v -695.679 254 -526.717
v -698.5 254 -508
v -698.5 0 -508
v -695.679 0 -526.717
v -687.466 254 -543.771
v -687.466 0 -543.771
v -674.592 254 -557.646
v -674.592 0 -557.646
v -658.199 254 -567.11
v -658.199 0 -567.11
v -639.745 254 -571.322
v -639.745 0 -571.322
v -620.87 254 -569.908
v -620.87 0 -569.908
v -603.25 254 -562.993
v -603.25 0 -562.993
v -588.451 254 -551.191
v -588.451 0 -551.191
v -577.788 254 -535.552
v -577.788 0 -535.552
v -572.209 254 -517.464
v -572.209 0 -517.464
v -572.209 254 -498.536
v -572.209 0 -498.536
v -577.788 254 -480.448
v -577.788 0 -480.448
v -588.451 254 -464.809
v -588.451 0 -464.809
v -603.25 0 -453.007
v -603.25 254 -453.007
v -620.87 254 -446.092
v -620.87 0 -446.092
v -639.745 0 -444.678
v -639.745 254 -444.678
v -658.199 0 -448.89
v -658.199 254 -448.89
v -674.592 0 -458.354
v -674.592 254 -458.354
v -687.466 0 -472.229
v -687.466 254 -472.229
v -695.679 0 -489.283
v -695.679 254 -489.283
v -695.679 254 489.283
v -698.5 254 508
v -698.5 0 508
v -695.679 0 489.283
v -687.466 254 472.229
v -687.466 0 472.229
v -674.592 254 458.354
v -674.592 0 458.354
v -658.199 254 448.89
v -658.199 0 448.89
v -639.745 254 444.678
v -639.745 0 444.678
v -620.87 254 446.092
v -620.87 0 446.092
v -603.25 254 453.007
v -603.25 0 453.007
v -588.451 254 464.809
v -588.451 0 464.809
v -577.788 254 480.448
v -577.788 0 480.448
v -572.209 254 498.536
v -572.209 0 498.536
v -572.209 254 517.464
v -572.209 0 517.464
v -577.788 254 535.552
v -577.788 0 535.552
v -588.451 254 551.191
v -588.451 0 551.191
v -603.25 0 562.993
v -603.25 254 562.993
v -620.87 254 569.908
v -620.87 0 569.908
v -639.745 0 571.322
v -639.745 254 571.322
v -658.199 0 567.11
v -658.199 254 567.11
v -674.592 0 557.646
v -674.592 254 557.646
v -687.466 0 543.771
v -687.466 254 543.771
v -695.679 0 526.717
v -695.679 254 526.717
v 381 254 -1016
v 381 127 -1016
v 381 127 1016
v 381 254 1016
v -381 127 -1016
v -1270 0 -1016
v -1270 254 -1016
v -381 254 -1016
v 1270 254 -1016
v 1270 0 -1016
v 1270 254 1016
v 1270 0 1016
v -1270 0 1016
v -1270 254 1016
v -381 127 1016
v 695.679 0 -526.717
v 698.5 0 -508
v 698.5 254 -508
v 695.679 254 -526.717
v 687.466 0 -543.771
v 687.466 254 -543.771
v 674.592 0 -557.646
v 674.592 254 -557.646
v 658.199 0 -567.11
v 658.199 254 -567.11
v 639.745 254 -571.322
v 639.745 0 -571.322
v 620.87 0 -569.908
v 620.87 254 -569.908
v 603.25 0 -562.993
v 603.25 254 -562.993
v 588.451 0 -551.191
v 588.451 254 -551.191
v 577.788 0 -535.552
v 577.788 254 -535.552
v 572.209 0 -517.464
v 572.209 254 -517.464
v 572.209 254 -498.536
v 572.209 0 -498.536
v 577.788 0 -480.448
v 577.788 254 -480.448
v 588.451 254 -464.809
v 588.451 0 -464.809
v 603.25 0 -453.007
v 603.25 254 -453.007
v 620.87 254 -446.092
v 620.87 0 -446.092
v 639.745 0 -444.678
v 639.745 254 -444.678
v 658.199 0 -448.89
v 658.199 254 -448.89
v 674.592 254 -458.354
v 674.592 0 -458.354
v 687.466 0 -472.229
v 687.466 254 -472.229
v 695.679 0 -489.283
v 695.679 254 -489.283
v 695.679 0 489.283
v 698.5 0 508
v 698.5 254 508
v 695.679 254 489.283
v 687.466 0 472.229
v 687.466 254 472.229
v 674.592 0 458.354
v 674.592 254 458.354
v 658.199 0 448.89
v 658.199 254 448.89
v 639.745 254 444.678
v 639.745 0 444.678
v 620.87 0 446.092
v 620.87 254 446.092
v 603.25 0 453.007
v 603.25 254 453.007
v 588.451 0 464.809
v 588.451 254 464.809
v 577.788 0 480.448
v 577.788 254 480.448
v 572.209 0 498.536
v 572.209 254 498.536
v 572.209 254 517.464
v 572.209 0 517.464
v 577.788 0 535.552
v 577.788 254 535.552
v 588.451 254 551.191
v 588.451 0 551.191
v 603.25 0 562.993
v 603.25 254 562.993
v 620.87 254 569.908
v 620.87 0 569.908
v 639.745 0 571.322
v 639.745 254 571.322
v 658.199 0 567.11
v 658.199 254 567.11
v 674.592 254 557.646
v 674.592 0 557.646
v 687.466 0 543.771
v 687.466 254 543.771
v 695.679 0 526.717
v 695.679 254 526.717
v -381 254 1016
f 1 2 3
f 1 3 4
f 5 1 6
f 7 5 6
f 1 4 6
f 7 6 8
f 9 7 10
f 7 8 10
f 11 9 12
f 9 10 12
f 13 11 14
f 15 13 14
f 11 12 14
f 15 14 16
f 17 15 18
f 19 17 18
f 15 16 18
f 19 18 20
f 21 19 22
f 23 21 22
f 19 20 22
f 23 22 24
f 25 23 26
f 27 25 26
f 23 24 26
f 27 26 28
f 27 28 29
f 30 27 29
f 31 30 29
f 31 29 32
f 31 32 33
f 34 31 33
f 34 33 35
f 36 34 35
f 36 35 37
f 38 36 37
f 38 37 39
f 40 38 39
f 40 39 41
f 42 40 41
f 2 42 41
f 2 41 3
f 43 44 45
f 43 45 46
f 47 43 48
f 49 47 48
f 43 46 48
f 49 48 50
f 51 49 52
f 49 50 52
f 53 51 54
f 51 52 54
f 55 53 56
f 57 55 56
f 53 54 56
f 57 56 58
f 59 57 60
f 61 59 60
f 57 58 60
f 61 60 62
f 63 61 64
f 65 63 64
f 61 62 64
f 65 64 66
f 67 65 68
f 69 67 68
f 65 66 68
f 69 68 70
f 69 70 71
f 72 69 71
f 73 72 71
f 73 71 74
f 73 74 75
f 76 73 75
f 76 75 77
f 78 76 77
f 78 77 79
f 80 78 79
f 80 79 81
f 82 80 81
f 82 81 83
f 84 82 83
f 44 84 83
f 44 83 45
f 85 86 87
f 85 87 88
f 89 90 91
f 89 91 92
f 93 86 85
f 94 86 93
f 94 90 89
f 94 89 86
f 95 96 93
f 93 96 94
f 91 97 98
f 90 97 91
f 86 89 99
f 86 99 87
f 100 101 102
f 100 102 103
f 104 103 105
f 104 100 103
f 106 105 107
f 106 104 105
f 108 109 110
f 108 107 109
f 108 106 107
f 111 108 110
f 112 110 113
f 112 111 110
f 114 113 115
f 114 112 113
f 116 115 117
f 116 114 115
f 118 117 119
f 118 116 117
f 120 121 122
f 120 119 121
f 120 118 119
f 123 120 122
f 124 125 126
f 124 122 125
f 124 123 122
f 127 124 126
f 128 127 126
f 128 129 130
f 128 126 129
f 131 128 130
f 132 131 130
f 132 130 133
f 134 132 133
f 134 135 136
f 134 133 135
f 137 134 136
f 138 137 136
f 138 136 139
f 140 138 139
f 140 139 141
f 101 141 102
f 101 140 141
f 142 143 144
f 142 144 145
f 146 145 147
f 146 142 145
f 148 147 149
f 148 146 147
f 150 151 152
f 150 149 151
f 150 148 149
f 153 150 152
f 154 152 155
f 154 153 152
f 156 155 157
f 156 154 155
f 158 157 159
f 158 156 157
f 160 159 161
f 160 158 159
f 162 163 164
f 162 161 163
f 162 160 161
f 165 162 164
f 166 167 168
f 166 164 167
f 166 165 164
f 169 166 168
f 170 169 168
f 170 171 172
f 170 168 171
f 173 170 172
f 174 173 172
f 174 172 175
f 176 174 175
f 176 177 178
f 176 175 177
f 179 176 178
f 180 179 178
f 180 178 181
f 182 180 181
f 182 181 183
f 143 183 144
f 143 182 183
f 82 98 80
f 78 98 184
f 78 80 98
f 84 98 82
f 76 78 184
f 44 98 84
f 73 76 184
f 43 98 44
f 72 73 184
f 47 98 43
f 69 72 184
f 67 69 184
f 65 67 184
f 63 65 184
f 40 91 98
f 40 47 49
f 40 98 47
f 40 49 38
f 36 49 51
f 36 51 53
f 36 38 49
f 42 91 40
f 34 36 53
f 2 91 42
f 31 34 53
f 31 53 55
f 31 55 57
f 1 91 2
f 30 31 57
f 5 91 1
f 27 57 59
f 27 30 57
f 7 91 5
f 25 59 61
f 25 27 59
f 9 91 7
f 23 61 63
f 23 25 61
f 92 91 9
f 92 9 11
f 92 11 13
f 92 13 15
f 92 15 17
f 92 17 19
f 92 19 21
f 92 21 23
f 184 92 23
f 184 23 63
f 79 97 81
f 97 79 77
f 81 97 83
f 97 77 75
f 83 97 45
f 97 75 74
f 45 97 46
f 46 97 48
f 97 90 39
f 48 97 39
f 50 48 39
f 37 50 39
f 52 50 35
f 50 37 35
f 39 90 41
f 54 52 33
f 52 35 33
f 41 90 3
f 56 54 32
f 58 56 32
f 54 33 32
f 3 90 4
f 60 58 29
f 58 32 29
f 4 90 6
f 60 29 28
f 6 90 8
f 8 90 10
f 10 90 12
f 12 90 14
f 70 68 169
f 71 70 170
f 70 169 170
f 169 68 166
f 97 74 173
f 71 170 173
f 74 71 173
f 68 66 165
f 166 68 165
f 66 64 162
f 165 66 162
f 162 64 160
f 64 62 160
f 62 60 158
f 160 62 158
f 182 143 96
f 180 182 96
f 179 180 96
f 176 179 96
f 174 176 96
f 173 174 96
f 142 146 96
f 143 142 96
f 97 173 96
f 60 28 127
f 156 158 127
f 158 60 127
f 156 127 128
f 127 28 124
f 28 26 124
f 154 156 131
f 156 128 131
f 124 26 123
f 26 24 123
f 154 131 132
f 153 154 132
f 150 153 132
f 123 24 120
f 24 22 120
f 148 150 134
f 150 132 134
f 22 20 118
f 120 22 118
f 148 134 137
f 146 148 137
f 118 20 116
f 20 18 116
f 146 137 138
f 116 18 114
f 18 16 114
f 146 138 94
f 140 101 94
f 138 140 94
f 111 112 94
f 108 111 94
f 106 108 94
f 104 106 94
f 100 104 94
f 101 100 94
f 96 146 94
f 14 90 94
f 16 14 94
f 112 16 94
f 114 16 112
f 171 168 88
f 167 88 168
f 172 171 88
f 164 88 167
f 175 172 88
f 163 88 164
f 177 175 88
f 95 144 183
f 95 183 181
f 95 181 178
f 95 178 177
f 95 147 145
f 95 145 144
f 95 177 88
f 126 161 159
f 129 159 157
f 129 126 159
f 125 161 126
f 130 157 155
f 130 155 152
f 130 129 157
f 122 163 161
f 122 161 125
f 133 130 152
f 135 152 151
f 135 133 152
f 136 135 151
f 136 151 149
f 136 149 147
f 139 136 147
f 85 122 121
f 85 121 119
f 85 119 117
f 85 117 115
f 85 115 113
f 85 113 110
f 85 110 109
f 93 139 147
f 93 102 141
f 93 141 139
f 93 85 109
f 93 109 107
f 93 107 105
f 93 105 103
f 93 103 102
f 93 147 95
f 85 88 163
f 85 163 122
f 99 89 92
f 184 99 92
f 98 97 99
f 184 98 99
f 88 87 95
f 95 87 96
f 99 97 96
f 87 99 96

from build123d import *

# Parameters (mm, degrees)
SKETCH1_W               = 2540
SKETCH1_H               = 2032
BOSS_EXTRUDE1_DEPTH     = 254
SKETCH2_W               = 762
SKETCH2_H               = 127
CUT_EXTRUDE1_DEPTH      = 1017
CUT_EXTRUDE1_DEPTH_BACK = 1017
F_5_DIAMETER_HOLE1_D    = 127


with BuildPart() as part:
    # Sketch1 → Boss-Extrude1 (new body)
    with BuildSketch(Plane(origin=(0, 0, 0), x_dir=(1, 0, 0), z_dir=(0, 1, 0))):
        Rectangle(SKETCH1_W, SKETCH1_H)
    extrude(amount=BOSS_EXTRUDE1_DEPTH)

    # Sketch2 → Cut-Extrude1 (cut, two sides)
    with BuildSketch(Plane.XY) as cut_extrude1_sk:
        with Locations((0, 190.5)):
            Rectangle(SKETCH2_W, SKETCH2_H)
    extrude(amount=CUT_EXTRUDE1_DEPTH, mode=Mode.SUBTRACT)
    extrude(cut_extrude1_sk.sketch, amount=-CUT_EXTRUDE1_DEPTH_BACK, mode=Mode.SUBTRACT)

    # 5" Diameter Hole1 (through all)
    with Locations(Plane(origin=(0, 254, 0), x_dir=(1, 0, 0), z_dir=(0, 1, 0))):
        with Locations((-635, 508), (-635, -508)):
            f_5_diameter_hole1 = Hole(F_5_DIAMETER_HOLE1_D / 2)

    # Mirror1: 5" Diameter Hole1 across plane
    add(f_5_diameter_hole1.mirror(Plane(origin=(0, 0, 0), x_dir=(0, 0, 1), z_dir=(1, 0, 0))), mode=Mode.SUBTRACT)


solid = part.part
